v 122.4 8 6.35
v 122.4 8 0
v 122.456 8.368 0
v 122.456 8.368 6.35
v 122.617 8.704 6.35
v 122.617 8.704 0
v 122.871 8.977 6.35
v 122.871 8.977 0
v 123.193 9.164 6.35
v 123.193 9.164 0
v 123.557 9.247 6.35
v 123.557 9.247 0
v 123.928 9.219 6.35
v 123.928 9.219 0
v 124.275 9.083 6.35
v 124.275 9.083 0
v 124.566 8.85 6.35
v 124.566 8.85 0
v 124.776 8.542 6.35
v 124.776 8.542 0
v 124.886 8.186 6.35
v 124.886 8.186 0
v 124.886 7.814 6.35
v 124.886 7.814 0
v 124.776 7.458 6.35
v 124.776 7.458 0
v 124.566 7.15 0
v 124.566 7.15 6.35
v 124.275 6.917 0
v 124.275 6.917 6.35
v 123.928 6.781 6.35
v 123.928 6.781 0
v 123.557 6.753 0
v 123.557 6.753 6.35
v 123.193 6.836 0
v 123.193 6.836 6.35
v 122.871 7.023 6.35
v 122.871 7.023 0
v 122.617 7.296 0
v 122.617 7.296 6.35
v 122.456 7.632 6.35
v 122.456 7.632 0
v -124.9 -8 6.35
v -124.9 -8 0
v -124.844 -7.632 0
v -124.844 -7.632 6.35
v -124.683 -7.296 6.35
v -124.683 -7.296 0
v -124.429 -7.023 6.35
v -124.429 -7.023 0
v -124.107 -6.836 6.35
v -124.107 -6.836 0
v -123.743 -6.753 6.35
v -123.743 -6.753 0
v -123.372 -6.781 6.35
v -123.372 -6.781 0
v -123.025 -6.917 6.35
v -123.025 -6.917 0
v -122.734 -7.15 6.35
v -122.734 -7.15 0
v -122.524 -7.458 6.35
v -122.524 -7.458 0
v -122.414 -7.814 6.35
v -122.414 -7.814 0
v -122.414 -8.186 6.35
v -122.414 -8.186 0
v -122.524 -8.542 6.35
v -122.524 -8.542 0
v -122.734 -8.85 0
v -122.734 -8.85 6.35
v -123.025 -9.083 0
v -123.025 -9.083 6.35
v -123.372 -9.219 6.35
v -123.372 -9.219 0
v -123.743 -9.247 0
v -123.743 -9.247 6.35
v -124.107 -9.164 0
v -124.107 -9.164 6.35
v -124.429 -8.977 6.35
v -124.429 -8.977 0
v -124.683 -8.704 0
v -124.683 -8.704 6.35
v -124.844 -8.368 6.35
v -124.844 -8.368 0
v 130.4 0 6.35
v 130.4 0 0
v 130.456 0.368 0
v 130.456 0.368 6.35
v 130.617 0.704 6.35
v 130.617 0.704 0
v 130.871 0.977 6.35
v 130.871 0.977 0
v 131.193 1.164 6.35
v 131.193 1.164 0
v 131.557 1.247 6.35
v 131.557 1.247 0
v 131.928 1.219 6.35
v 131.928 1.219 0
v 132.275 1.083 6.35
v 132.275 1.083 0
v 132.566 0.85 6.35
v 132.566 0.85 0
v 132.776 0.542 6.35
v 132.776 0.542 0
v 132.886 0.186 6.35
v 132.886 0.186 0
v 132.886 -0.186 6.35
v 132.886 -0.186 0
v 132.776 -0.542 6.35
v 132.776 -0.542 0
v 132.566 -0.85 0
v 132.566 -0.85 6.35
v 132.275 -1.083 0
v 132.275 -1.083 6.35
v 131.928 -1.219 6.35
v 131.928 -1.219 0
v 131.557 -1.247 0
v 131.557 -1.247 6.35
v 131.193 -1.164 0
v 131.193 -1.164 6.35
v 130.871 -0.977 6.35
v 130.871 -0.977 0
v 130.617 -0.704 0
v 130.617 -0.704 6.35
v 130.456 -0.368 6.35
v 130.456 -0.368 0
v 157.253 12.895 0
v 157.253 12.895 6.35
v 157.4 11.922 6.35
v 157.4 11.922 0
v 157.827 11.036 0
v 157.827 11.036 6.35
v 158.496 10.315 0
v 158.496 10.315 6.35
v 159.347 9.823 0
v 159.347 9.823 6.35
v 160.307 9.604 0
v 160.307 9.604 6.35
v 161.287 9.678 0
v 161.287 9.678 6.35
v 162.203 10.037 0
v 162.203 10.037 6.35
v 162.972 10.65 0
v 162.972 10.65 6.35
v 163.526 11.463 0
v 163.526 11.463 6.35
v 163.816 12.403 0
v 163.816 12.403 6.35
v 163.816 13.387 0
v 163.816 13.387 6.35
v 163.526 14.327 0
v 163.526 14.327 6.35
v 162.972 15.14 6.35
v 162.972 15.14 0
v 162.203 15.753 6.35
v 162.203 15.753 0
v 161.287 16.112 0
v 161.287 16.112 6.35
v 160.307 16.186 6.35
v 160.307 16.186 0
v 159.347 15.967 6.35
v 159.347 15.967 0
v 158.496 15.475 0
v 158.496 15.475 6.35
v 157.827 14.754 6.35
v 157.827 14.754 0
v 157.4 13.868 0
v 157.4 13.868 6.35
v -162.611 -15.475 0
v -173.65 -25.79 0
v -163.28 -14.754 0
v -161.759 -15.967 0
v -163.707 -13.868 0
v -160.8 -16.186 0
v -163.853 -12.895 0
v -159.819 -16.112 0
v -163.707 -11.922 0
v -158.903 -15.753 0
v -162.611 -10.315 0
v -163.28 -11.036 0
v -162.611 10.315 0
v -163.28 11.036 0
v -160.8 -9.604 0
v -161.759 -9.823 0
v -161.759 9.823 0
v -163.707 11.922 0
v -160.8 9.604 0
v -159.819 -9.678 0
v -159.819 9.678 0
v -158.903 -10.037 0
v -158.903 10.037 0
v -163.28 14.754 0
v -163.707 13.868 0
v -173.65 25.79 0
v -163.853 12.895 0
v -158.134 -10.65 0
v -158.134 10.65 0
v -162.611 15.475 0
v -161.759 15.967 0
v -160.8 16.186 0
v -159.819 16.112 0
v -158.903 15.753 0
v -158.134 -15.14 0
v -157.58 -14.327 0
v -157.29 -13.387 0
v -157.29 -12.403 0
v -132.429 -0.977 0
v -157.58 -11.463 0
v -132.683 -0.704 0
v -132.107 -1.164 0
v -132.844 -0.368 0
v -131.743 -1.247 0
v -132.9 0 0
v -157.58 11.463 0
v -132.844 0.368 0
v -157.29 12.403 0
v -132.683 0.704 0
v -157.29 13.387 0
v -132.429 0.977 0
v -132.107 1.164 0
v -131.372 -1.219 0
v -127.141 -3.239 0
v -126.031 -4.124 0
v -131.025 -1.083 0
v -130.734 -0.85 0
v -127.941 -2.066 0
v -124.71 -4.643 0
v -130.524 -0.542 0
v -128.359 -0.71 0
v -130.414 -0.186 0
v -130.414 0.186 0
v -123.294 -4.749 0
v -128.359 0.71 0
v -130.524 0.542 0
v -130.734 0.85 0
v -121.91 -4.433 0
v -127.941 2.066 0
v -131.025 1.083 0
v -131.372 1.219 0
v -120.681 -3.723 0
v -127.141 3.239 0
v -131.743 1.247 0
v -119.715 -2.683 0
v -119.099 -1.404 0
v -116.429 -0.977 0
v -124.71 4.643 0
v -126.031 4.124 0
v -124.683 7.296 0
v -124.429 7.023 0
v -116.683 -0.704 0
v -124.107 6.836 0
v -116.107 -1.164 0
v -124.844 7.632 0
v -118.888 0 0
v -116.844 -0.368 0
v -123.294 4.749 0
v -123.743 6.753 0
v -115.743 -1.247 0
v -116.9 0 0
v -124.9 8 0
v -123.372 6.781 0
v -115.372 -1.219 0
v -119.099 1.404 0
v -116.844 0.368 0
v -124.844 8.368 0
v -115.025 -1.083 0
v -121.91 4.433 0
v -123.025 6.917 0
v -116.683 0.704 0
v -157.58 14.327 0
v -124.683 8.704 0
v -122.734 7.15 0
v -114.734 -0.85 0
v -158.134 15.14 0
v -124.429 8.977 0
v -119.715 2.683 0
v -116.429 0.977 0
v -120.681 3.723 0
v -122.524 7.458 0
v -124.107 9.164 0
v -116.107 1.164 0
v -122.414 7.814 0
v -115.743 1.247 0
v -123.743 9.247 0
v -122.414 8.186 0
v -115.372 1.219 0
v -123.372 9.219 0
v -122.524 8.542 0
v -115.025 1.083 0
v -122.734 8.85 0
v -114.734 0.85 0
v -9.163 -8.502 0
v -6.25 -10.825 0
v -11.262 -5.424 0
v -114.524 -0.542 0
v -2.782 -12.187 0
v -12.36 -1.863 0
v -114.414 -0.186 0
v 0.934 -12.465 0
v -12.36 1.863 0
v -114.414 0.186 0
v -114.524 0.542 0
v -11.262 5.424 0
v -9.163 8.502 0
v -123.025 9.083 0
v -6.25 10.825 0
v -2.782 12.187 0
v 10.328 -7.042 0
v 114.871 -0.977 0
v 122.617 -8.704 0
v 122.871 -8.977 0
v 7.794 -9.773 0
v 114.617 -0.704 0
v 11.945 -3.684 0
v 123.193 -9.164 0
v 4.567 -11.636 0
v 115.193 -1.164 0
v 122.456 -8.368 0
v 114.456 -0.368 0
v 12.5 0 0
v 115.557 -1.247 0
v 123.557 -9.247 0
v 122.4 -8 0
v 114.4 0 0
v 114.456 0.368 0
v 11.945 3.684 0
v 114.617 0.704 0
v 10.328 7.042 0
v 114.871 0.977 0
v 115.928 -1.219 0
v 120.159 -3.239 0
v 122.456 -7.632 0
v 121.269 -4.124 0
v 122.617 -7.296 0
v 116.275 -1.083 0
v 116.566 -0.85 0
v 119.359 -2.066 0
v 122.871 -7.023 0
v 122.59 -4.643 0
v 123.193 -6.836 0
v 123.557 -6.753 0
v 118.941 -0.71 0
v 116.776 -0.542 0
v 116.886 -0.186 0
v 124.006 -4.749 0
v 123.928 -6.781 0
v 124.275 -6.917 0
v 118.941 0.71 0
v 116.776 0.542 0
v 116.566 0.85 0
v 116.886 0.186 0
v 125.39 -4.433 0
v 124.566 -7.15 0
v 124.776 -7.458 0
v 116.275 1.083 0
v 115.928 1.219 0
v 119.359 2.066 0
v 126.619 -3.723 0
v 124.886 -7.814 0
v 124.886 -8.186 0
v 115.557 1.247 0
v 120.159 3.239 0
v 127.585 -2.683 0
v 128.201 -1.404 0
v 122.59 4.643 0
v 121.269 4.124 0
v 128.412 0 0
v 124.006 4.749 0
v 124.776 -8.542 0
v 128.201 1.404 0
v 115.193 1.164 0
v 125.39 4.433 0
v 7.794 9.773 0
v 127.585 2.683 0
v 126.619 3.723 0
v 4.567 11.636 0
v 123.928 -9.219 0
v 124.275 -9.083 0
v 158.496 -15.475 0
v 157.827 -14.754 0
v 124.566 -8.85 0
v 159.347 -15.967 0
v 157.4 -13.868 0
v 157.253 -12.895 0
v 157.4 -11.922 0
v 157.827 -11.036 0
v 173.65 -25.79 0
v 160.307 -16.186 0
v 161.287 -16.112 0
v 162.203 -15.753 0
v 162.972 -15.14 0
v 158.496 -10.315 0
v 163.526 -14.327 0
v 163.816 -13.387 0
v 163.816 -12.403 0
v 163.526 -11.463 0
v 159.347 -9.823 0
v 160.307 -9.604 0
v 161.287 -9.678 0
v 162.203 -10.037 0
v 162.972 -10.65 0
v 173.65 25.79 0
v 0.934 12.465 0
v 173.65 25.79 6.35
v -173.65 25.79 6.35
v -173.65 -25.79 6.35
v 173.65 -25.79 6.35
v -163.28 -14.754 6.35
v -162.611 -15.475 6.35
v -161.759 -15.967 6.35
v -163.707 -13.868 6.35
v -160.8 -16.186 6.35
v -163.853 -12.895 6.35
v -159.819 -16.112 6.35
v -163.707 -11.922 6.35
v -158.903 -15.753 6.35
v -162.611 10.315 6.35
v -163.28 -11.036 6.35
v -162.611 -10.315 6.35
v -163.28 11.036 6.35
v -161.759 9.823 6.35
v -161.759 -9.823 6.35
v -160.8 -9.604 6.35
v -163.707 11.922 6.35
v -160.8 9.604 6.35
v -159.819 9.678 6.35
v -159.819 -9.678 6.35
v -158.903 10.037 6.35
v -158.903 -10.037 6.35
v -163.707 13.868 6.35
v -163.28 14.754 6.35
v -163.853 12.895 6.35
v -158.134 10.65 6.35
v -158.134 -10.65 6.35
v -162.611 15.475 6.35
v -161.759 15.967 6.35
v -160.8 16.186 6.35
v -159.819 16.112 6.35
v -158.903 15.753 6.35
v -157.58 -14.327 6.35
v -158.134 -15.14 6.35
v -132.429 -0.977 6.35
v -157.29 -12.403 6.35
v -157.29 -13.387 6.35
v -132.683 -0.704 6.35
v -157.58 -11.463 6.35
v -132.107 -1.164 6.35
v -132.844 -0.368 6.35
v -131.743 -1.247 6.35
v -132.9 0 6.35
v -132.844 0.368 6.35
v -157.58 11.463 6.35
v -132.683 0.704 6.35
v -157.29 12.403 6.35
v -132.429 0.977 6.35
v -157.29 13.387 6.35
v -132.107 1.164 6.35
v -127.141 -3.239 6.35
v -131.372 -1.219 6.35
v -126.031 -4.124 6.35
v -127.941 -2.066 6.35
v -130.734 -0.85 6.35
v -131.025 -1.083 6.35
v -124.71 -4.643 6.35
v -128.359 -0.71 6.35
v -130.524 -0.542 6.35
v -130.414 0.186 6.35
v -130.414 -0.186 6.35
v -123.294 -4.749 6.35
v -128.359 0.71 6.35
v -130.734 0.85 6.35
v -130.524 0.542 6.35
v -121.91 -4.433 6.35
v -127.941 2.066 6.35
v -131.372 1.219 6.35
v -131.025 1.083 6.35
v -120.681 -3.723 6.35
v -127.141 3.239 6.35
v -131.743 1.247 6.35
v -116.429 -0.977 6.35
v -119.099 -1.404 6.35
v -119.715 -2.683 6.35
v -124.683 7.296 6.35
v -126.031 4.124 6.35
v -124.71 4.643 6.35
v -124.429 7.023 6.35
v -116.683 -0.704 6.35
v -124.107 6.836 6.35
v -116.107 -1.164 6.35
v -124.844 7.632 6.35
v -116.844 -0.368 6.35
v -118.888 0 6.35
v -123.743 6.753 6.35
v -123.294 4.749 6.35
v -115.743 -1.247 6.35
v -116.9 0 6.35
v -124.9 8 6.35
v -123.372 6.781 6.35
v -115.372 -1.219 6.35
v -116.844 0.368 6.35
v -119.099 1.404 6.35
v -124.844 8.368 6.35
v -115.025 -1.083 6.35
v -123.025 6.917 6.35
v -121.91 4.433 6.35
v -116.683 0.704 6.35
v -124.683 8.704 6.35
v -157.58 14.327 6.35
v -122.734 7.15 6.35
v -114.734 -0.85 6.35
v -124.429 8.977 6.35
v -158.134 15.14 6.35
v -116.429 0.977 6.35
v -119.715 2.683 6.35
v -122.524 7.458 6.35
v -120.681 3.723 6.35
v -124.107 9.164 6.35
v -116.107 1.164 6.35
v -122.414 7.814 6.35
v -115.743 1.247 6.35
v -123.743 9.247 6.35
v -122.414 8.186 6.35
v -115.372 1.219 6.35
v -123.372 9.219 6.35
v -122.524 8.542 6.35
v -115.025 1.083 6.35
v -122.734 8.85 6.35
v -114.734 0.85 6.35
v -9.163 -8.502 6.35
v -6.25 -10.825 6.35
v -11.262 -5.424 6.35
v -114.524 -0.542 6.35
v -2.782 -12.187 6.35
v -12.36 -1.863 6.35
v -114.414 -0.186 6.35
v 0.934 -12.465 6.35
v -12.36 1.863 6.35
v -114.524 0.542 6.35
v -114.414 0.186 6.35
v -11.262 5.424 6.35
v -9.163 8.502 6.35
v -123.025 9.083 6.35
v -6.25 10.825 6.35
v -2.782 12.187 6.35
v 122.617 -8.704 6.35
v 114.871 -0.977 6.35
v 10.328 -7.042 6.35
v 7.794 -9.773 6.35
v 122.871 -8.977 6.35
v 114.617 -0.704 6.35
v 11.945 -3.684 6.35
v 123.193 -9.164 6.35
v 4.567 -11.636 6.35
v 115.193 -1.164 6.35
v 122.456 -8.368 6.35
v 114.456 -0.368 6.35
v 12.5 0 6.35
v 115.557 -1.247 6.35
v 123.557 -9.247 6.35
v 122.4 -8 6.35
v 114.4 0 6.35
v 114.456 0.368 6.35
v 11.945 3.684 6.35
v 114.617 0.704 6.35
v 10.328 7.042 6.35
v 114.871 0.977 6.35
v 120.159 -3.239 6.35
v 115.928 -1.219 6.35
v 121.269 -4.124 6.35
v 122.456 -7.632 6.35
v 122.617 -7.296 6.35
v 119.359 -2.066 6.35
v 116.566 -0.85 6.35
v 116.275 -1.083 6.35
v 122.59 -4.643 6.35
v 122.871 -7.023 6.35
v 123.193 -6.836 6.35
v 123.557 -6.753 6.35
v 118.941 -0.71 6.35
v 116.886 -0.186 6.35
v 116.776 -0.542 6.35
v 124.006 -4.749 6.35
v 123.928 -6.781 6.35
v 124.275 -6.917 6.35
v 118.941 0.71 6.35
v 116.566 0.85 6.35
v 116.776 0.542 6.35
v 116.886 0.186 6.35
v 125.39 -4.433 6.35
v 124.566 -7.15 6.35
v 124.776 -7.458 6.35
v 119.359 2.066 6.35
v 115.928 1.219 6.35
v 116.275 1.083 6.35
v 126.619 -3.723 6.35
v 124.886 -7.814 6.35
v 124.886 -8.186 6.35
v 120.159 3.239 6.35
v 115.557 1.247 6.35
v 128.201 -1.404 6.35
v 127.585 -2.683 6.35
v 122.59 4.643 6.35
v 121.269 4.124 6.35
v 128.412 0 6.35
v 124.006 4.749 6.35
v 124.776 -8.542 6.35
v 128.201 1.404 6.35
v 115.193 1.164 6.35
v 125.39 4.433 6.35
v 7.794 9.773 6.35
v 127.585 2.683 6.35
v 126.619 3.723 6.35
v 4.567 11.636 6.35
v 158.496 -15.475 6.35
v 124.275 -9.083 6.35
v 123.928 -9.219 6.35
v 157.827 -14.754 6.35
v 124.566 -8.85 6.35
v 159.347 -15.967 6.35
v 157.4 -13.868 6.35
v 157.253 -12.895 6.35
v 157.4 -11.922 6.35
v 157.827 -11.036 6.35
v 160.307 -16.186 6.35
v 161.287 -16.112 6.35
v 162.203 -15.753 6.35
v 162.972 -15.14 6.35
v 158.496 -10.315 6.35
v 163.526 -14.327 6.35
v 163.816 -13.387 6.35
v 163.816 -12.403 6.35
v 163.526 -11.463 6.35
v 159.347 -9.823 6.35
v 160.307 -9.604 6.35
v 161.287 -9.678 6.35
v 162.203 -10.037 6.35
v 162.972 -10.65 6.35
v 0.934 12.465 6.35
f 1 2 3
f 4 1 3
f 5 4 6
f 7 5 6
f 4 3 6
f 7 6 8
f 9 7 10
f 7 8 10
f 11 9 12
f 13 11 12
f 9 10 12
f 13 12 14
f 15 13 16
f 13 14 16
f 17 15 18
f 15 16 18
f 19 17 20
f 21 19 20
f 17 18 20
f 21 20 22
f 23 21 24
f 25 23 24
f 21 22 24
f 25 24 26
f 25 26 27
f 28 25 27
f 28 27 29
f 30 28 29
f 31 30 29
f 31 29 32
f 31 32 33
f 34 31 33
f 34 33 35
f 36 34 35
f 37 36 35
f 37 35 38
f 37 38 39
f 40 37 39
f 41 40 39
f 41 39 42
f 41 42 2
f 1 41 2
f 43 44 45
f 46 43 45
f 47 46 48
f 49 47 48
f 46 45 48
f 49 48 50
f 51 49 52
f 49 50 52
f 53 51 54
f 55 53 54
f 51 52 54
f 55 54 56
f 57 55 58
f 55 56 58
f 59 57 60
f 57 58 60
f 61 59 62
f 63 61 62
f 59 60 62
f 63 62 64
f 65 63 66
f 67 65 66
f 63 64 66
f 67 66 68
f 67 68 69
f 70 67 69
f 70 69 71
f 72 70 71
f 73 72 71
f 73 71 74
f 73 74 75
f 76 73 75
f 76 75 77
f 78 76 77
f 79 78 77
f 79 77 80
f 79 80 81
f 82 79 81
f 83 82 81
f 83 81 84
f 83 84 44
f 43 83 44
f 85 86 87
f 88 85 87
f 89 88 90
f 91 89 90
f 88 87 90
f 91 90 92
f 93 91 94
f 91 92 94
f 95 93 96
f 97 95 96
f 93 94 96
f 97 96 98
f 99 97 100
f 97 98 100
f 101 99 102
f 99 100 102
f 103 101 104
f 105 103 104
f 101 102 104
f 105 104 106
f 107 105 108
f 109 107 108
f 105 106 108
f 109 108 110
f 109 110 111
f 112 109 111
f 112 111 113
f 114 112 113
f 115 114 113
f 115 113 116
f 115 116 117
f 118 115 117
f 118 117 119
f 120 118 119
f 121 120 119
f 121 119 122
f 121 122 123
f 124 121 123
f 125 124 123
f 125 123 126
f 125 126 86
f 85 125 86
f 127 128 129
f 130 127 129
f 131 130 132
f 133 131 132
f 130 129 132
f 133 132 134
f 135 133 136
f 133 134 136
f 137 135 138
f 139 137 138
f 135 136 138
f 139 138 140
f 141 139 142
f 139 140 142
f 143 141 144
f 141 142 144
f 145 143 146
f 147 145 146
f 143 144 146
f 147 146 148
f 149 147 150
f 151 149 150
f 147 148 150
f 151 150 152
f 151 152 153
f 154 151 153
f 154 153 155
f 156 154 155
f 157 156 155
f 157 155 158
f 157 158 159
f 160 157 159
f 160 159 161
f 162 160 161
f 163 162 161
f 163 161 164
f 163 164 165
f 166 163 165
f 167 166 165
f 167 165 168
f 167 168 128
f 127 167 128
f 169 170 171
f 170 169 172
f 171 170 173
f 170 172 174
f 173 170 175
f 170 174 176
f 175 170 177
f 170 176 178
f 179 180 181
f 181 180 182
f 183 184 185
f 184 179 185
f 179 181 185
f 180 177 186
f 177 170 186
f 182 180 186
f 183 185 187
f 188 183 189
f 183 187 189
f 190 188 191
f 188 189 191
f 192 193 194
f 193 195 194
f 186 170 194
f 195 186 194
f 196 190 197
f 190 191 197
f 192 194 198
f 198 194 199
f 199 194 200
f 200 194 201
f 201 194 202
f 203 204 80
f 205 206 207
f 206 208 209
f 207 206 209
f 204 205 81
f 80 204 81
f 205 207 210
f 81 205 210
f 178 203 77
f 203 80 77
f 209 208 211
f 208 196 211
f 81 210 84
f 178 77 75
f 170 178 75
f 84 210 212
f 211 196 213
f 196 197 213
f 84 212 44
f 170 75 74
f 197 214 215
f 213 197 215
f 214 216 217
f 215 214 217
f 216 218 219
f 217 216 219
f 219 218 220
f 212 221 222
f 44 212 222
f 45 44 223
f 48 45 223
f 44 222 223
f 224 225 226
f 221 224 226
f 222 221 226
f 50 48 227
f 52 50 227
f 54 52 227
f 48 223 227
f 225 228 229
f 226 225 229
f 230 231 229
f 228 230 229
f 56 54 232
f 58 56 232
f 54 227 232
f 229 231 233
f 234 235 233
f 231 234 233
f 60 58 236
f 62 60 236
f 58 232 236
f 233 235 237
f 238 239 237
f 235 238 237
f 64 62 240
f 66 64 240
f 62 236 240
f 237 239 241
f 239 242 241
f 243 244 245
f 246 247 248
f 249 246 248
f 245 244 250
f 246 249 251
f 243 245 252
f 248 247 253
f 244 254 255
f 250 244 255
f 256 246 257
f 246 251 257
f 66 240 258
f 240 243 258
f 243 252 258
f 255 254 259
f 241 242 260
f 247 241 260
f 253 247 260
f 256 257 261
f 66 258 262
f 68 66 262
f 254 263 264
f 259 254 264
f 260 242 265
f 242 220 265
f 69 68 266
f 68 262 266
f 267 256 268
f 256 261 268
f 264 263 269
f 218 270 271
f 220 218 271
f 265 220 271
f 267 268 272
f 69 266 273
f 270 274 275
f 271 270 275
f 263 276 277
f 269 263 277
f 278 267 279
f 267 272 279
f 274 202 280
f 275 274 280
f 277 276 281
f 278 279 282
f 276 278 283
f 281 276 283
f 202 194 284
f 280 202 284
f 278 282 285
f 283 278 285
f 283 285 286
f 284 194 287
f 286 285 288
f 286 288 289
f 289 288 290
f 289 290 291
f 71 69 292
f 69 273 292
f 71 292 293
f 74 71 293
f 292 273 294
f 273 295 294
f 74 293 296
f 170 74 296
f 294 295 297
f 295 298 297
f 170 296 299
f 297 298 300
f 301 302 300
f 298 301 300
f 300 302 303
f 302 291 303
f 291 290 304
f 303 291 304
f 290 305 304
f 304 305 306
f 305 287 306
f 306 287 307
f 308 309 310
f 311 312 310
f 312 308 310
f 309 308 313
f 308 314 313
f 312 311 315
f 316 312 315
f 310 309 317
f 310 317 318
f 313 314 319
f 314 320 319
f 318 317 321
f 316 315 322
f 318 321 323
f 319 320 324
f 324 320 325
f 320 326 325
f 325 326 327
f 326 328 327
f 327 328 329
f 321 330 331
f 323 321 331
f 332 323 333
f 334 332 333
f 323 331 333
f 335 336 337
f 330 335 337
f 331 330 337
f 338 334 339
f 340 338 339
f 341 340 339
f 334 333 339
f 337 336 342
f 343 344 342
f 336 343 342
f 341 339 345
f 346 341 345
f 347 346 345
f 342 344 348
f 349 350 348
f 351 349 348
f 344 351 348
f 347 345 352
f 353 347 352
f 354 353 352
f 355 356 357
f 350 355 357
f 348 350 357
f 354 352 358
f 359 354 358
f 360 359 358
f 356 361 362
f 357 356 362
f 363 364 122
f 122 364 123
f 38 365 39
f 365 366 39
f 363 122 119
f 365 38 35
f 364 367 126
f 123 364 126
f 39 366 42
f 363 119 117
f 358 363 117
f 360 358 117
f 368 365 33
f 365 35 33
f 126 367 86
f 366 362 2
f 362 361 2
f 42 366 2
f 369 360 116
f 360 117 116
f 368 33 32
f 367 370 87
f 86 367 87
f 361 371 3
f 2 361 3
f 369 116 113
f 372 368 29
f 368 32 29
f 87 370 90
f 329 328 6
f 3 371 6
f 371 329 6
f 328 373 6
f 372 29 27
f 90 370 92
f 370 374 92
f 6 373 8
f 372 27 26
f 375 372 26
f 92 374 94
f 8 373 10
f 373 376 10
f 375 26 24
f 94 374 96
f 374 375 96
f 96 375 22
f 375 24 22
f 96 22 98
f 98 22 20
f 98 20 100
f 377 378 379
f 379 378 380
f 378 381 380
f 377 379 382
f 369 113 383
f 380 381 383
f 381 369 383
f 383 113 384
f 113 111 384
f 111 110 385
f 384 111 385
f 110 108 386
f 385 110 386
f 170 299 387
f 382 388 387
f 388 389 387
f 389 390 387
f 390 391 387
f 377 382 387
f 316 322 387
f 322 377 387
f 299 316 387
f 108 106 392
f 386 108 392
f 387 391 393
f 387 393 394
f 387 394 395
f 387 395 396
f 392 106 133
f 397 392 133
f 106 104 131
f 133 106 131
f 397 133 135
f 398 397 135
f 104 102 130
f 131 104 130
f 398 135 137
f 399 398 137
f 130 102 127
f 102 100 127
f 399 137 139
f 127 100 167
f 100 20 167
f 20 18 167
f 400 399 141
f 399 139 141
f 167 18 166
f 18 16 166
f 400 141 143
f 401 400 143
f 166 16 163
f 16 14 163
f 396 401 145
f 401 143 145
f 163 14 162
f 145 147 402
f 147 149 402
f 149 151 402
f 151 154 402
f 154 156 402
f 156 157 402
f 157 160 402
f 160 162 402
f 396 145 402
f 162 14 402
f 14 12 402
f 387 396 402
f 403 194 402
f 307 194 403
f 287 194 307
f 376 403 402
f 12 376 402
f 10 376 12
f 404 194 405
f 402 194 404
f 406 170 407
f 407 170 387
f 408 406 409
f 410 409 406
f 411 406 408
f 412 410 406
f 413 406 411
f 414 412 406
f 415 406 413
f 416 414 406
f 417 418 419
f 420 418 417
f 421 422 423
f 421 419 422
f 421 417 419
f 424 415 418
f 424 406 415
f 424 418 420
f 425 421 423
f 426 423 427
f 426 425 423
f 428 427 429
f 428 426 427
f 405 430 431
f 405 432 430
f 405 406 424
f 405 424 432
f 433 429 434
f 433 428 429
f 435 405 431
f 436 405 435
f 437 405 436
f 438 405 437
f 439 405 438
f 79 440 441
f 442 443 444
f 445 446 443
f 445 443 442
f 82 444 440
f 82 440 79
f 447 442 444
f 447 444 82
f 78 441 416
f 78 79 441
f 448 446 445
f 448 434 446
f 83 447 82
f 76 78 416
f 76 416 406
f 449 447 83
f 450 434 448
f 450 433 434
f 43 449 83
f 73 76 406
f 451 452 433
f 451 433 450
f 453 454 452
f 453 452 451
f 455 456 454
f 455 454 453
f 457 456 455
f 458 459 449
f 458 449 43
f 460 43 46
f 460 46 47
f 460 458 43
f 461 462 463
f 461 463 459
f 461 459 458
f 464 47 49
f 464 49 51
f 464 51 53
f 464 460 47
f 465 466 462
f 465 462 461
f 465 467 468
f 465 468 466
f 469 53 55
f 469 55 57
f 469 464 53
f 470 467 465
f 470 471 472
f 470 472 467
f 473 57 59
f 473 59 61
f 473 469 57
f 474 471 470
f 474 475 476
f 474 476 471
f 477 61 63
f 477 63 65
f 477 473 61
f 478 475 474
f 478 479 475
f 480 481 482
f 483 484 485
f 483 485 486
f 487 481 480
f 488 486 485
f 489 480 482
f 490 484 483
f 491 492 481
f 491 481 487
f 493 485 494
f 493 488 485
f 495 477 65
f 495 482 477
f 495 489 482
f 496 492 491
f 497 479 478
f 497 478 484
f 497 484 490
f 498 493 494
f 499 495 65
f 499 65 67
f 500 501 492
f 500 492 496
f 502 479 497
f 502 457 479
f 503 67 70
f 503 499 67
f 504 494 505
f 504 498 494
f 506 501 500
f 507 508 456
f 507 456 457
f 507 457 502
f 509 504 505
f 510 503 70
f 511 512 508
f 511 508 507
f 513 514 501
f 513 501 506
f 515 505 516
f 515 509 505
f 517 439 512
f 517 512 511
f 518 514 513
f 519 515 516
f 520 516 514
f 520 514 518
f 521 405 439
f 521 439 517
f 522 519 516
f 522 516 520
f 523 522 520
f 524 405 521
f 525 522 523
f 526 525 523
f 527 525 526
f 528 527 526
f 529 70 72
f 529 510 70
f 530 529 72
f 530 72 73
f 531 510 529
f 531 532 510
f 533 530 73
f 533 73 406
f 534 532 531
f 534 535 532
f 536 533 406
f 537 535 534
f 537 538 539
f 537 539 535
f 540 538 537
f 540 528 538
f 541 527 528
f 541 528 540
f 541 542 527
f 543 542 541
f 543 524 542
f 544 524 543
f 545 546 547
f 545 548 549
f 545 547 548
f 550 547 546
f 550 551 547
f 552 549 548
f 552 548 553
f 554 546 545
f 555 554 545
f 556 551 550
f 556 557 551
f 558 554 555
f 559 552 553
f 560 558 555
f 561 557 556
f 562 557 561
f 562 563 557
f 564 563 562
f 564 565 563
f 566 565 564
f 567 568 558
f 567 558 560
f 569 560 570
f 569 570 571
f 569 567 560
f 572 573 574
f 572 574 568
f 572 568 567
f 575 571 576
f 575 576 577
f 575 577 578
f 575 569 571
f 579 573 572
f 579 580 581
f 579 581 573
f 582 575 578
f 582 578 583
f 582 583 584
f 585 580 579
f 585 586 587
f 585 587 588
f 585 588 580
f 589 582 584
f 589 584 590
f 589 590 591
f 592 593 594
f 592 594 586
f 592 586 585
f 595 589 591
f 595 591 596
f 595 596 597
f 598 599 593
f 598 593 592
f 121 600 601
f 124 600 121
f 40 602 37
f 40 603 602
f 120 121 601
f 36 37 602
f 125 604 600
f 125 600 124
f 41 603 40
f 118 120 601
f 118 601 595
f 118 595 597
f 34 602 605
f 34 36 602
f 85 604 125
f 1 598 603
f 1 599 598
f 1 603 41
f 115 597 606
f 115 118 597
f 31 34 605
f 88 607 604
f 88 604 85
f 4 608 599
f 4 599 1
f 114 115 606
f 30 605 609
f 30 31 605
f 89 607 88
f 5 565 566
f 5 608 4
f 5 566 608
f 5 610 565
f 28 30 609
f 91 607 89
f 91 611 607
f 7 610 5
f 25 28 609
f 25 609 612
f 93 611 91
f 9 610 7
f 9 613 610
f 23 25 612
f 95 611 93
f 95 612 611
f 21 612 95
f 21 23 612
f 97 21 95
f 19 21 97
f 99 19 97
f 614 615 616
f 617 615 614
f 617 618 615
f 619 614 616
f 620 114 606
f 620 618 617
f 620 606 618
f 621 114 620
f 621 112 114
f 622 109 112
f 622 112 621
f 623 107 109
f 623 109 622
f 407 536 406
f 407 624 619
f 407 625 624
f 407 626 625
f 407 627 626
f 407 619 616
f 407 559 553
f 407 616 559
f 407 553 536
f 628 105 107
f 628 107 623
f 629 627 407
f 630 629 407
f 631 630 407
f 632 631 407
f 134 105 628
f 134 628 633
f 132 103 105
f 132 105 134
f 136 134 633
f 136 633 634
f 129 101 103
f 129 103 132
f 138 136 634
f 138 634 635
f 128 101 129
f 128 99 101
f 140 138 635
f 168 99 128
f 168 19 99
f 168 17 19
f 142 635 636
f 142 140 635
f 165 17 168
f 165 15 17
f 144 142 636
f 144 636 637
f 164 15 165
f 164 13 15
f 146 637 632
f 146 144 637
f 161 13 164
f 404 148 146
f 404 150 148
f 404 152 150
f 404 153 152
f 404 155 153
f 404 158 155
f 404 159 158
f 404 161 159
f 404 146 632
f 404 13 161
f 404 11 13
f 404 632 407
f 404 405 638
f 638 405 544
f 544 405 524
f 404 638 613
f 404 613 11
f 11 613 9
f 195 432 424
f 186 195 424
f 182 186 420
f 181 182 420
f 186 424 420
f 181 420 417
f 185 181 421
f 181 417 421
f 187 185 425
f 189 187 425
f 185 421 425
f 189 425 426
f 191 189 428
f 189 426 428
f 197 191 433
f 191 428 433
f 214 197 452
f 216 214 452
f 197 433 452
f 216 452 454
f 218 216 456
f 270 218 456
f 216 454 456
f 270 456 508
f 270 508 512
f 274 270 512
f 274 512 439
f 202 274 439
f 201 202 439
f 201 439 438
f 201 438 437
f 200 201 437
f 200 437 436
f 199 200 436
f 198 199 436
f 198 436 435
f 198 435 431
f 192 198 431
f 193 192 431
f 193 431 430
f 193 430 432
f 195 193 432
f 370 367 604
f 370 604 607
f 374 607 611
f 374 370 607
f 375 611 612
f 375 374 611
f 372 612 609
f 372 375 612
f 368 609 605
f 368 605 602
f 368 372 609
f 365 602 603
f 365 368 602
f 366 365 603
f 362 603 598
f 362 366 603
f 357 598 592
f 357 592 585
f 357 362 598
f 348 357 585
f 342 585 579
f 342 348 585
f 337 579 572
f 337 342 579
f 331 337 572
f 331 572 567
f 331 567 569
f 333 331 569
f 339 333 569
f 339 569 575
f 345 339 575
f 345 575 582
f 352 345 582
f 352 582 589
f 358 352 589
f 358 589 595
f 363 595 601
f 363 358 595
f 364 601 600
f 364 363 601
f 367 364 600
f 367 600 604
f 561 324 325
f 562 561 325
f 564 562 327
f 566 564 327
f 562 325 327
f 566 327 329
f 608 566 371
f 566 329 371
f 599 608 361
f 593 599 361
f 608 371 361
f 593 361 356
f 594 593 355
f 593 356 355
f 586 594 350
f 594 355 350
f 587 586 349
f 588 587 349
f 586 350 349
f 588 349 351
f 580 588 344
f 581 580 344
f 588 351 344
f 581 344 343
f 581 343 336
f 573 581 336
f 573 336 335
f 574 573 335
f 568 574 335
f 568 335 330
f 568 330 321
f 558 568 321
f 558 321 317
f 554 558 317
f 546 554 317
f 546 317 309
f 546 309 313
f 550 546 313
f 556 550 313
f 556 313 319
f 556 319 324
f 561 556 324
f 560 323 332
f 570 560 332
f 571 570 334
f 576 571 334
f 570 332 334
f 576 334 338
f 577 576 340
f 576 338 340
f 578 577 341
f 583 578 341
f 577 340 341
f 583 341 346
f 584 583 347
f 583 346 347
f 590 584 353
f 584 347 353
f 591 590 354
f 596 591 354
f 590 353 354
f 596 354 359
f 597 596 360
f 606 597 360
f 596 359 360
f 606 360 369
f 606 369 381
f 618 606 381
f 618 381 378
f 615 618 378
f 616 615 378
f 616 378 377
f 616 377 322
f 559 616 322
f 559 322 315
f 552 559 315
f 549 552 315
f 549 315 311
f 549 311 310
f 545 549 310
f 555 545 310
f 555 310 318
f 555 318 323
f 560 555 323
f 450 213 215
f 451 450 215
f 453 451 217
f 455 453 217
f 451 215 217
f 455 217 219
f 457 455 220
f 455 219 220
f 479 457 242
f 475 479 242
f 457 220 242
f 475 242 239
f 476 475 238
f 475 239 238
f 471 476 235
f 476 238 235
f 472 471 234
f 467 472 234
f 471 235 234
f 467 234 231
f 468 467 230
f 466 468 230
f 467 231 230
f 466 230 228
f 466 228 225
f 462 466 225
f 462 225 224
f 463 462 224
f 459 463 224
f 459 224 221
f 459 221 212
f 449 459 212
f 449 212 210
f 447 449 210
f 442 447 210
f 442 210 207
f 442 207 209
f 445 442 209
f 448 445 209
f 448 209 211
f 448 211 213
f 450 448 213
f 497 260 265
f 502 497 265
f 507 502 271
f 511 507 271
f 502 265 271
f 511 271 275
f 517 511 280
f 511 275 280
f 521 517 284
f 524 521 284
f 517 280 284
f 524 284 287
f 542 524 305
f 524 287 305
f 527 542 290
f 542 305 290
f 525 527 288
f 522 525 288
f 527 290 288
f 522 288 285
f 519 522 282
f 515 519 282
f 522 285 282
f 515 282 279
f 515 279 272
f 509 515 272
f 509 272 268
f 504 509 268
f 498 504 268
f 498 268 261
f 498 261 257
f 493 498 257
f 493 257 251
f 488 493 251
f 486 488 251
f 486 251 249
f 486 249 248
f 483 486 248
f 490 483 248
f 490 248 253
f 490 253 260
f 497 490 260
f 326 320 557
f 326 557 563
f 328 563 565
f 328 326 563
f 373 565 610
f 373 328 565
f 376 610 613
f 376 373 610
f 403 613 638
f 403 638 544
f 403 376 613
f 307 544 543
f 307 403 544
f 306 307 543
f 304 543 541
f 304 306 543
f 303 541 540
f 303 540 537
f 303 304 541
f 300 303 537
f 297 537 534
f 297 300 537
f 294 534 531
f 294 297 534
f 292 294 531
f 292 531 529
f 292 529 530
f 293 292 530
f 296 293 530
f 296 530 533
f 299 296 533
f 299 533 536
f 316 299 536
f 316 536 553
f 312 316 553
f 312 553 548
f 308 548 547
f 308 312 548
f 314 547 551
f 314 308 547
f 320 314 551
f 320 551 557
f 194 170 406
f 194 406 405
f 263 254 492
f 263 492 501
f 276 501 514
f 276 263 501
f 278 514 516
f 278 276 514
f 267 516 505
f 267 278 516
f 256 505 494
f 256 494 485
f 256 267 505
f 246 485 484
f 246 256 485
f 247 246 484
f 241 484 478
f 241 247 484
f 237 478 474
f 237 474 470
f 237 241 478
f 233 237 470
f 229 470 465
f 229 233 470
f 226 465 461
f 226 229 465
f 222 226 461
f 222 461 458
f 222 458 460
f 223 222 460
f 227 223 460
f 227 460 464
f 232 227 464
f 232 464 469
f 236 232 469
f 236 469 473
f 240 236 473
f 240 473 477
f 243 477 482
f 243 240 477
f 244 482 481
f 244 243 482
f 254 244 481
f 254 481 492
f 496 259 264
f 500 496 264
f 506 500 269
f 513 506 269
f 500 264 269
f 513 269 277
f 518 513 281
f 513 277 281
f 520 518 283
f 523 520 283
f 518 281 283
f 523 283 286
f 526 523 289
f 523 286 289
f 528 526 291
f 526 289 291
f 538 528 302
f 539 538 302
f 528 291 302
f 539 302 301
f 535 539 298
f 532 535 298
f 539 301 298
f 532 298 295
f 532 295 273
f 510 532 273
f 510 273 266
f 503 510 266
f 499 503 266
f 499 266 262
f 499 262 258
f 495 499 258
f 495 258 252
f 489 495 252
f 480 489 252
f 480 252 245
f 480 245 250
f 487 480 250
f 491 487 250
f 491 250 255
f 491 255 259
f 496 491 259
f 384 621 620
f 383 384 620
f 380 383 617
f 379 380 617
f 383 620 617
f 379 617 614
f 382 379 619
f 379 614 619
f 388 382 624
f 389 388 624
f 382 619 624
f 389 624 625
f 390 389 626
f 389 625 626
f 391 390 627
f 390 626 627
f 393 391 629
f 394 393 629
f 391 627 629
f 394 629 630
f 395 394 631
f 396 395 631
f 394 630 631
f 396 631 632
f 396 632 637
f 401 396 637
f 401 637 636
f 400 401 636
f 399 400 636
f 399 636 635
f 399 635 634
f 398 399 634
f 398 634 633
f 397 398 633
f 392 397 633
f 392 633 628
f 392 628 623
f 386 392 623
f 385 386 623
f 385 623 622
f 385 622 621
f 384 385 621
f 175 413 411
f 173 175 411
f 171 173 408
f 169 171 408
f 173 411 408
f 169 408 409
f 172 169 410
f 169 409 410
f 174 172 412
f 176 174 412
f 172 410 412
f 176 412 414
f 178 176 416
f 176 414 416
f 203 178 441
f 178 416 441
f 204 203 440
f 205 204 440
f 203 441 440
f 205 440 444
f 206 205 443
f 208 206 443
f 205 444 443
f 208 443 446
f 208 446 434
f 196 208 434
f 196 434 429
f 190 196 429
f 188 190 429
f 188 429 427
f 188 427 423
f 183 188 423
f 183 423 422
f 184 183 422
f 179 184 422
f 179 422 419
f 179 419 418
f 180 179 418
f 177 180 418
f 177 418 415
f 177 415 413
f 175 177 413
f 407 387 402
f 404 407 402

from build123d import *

# Parameters (mm, degrees)
F0_W     = 347.3
F0_H     = 51.58
F0_R     = 4.7625
F0_R_2   = 12.5
F1_DEPTH = 6.35
F3_D     = 6.6
F5_D     = 2.5


with BuildPart() as f1:
    # F0 (on Top) → F1 (new body)
    with BuildSketch(Plane.XY):
        Rectangle(F0_W, F0_H)
        with Locations((-123.65, 0)):
            Circle(F0_R, mode=Mode.SUBTRACT)
        Circle(F0_R_2, mode=Mode.SUBTRACT)
        with Locations((123.65, 0)):
            Circle(F0_R, mode=Mode.SUBTRACT)
    extrude(amount=F1_DEPTH)

    # F3 (through all)
    with Locations(Plane(origin=(0, 0, 0), x_dir=(1, 0, 0), z_dir=(0, 0, -1))):
        with Locations((-160.553125, 12.895), (-160.553125, -12.895), (160.553125, 12.895), (160.553125, -12.895)):
            Hole(F3_D / 2)

    # F5 (through all)
    with Locations(Plane.XY.offset(6.35)):
        with Locations((-123.65, 8), (-115.65, 0), (-123.65, -8), (-131.65, 0), (123.65, 8), (131.65, 0), (123.65, -8), (115.65, 0)):
            Hole(F5_D / 2)


solid = f1.part
